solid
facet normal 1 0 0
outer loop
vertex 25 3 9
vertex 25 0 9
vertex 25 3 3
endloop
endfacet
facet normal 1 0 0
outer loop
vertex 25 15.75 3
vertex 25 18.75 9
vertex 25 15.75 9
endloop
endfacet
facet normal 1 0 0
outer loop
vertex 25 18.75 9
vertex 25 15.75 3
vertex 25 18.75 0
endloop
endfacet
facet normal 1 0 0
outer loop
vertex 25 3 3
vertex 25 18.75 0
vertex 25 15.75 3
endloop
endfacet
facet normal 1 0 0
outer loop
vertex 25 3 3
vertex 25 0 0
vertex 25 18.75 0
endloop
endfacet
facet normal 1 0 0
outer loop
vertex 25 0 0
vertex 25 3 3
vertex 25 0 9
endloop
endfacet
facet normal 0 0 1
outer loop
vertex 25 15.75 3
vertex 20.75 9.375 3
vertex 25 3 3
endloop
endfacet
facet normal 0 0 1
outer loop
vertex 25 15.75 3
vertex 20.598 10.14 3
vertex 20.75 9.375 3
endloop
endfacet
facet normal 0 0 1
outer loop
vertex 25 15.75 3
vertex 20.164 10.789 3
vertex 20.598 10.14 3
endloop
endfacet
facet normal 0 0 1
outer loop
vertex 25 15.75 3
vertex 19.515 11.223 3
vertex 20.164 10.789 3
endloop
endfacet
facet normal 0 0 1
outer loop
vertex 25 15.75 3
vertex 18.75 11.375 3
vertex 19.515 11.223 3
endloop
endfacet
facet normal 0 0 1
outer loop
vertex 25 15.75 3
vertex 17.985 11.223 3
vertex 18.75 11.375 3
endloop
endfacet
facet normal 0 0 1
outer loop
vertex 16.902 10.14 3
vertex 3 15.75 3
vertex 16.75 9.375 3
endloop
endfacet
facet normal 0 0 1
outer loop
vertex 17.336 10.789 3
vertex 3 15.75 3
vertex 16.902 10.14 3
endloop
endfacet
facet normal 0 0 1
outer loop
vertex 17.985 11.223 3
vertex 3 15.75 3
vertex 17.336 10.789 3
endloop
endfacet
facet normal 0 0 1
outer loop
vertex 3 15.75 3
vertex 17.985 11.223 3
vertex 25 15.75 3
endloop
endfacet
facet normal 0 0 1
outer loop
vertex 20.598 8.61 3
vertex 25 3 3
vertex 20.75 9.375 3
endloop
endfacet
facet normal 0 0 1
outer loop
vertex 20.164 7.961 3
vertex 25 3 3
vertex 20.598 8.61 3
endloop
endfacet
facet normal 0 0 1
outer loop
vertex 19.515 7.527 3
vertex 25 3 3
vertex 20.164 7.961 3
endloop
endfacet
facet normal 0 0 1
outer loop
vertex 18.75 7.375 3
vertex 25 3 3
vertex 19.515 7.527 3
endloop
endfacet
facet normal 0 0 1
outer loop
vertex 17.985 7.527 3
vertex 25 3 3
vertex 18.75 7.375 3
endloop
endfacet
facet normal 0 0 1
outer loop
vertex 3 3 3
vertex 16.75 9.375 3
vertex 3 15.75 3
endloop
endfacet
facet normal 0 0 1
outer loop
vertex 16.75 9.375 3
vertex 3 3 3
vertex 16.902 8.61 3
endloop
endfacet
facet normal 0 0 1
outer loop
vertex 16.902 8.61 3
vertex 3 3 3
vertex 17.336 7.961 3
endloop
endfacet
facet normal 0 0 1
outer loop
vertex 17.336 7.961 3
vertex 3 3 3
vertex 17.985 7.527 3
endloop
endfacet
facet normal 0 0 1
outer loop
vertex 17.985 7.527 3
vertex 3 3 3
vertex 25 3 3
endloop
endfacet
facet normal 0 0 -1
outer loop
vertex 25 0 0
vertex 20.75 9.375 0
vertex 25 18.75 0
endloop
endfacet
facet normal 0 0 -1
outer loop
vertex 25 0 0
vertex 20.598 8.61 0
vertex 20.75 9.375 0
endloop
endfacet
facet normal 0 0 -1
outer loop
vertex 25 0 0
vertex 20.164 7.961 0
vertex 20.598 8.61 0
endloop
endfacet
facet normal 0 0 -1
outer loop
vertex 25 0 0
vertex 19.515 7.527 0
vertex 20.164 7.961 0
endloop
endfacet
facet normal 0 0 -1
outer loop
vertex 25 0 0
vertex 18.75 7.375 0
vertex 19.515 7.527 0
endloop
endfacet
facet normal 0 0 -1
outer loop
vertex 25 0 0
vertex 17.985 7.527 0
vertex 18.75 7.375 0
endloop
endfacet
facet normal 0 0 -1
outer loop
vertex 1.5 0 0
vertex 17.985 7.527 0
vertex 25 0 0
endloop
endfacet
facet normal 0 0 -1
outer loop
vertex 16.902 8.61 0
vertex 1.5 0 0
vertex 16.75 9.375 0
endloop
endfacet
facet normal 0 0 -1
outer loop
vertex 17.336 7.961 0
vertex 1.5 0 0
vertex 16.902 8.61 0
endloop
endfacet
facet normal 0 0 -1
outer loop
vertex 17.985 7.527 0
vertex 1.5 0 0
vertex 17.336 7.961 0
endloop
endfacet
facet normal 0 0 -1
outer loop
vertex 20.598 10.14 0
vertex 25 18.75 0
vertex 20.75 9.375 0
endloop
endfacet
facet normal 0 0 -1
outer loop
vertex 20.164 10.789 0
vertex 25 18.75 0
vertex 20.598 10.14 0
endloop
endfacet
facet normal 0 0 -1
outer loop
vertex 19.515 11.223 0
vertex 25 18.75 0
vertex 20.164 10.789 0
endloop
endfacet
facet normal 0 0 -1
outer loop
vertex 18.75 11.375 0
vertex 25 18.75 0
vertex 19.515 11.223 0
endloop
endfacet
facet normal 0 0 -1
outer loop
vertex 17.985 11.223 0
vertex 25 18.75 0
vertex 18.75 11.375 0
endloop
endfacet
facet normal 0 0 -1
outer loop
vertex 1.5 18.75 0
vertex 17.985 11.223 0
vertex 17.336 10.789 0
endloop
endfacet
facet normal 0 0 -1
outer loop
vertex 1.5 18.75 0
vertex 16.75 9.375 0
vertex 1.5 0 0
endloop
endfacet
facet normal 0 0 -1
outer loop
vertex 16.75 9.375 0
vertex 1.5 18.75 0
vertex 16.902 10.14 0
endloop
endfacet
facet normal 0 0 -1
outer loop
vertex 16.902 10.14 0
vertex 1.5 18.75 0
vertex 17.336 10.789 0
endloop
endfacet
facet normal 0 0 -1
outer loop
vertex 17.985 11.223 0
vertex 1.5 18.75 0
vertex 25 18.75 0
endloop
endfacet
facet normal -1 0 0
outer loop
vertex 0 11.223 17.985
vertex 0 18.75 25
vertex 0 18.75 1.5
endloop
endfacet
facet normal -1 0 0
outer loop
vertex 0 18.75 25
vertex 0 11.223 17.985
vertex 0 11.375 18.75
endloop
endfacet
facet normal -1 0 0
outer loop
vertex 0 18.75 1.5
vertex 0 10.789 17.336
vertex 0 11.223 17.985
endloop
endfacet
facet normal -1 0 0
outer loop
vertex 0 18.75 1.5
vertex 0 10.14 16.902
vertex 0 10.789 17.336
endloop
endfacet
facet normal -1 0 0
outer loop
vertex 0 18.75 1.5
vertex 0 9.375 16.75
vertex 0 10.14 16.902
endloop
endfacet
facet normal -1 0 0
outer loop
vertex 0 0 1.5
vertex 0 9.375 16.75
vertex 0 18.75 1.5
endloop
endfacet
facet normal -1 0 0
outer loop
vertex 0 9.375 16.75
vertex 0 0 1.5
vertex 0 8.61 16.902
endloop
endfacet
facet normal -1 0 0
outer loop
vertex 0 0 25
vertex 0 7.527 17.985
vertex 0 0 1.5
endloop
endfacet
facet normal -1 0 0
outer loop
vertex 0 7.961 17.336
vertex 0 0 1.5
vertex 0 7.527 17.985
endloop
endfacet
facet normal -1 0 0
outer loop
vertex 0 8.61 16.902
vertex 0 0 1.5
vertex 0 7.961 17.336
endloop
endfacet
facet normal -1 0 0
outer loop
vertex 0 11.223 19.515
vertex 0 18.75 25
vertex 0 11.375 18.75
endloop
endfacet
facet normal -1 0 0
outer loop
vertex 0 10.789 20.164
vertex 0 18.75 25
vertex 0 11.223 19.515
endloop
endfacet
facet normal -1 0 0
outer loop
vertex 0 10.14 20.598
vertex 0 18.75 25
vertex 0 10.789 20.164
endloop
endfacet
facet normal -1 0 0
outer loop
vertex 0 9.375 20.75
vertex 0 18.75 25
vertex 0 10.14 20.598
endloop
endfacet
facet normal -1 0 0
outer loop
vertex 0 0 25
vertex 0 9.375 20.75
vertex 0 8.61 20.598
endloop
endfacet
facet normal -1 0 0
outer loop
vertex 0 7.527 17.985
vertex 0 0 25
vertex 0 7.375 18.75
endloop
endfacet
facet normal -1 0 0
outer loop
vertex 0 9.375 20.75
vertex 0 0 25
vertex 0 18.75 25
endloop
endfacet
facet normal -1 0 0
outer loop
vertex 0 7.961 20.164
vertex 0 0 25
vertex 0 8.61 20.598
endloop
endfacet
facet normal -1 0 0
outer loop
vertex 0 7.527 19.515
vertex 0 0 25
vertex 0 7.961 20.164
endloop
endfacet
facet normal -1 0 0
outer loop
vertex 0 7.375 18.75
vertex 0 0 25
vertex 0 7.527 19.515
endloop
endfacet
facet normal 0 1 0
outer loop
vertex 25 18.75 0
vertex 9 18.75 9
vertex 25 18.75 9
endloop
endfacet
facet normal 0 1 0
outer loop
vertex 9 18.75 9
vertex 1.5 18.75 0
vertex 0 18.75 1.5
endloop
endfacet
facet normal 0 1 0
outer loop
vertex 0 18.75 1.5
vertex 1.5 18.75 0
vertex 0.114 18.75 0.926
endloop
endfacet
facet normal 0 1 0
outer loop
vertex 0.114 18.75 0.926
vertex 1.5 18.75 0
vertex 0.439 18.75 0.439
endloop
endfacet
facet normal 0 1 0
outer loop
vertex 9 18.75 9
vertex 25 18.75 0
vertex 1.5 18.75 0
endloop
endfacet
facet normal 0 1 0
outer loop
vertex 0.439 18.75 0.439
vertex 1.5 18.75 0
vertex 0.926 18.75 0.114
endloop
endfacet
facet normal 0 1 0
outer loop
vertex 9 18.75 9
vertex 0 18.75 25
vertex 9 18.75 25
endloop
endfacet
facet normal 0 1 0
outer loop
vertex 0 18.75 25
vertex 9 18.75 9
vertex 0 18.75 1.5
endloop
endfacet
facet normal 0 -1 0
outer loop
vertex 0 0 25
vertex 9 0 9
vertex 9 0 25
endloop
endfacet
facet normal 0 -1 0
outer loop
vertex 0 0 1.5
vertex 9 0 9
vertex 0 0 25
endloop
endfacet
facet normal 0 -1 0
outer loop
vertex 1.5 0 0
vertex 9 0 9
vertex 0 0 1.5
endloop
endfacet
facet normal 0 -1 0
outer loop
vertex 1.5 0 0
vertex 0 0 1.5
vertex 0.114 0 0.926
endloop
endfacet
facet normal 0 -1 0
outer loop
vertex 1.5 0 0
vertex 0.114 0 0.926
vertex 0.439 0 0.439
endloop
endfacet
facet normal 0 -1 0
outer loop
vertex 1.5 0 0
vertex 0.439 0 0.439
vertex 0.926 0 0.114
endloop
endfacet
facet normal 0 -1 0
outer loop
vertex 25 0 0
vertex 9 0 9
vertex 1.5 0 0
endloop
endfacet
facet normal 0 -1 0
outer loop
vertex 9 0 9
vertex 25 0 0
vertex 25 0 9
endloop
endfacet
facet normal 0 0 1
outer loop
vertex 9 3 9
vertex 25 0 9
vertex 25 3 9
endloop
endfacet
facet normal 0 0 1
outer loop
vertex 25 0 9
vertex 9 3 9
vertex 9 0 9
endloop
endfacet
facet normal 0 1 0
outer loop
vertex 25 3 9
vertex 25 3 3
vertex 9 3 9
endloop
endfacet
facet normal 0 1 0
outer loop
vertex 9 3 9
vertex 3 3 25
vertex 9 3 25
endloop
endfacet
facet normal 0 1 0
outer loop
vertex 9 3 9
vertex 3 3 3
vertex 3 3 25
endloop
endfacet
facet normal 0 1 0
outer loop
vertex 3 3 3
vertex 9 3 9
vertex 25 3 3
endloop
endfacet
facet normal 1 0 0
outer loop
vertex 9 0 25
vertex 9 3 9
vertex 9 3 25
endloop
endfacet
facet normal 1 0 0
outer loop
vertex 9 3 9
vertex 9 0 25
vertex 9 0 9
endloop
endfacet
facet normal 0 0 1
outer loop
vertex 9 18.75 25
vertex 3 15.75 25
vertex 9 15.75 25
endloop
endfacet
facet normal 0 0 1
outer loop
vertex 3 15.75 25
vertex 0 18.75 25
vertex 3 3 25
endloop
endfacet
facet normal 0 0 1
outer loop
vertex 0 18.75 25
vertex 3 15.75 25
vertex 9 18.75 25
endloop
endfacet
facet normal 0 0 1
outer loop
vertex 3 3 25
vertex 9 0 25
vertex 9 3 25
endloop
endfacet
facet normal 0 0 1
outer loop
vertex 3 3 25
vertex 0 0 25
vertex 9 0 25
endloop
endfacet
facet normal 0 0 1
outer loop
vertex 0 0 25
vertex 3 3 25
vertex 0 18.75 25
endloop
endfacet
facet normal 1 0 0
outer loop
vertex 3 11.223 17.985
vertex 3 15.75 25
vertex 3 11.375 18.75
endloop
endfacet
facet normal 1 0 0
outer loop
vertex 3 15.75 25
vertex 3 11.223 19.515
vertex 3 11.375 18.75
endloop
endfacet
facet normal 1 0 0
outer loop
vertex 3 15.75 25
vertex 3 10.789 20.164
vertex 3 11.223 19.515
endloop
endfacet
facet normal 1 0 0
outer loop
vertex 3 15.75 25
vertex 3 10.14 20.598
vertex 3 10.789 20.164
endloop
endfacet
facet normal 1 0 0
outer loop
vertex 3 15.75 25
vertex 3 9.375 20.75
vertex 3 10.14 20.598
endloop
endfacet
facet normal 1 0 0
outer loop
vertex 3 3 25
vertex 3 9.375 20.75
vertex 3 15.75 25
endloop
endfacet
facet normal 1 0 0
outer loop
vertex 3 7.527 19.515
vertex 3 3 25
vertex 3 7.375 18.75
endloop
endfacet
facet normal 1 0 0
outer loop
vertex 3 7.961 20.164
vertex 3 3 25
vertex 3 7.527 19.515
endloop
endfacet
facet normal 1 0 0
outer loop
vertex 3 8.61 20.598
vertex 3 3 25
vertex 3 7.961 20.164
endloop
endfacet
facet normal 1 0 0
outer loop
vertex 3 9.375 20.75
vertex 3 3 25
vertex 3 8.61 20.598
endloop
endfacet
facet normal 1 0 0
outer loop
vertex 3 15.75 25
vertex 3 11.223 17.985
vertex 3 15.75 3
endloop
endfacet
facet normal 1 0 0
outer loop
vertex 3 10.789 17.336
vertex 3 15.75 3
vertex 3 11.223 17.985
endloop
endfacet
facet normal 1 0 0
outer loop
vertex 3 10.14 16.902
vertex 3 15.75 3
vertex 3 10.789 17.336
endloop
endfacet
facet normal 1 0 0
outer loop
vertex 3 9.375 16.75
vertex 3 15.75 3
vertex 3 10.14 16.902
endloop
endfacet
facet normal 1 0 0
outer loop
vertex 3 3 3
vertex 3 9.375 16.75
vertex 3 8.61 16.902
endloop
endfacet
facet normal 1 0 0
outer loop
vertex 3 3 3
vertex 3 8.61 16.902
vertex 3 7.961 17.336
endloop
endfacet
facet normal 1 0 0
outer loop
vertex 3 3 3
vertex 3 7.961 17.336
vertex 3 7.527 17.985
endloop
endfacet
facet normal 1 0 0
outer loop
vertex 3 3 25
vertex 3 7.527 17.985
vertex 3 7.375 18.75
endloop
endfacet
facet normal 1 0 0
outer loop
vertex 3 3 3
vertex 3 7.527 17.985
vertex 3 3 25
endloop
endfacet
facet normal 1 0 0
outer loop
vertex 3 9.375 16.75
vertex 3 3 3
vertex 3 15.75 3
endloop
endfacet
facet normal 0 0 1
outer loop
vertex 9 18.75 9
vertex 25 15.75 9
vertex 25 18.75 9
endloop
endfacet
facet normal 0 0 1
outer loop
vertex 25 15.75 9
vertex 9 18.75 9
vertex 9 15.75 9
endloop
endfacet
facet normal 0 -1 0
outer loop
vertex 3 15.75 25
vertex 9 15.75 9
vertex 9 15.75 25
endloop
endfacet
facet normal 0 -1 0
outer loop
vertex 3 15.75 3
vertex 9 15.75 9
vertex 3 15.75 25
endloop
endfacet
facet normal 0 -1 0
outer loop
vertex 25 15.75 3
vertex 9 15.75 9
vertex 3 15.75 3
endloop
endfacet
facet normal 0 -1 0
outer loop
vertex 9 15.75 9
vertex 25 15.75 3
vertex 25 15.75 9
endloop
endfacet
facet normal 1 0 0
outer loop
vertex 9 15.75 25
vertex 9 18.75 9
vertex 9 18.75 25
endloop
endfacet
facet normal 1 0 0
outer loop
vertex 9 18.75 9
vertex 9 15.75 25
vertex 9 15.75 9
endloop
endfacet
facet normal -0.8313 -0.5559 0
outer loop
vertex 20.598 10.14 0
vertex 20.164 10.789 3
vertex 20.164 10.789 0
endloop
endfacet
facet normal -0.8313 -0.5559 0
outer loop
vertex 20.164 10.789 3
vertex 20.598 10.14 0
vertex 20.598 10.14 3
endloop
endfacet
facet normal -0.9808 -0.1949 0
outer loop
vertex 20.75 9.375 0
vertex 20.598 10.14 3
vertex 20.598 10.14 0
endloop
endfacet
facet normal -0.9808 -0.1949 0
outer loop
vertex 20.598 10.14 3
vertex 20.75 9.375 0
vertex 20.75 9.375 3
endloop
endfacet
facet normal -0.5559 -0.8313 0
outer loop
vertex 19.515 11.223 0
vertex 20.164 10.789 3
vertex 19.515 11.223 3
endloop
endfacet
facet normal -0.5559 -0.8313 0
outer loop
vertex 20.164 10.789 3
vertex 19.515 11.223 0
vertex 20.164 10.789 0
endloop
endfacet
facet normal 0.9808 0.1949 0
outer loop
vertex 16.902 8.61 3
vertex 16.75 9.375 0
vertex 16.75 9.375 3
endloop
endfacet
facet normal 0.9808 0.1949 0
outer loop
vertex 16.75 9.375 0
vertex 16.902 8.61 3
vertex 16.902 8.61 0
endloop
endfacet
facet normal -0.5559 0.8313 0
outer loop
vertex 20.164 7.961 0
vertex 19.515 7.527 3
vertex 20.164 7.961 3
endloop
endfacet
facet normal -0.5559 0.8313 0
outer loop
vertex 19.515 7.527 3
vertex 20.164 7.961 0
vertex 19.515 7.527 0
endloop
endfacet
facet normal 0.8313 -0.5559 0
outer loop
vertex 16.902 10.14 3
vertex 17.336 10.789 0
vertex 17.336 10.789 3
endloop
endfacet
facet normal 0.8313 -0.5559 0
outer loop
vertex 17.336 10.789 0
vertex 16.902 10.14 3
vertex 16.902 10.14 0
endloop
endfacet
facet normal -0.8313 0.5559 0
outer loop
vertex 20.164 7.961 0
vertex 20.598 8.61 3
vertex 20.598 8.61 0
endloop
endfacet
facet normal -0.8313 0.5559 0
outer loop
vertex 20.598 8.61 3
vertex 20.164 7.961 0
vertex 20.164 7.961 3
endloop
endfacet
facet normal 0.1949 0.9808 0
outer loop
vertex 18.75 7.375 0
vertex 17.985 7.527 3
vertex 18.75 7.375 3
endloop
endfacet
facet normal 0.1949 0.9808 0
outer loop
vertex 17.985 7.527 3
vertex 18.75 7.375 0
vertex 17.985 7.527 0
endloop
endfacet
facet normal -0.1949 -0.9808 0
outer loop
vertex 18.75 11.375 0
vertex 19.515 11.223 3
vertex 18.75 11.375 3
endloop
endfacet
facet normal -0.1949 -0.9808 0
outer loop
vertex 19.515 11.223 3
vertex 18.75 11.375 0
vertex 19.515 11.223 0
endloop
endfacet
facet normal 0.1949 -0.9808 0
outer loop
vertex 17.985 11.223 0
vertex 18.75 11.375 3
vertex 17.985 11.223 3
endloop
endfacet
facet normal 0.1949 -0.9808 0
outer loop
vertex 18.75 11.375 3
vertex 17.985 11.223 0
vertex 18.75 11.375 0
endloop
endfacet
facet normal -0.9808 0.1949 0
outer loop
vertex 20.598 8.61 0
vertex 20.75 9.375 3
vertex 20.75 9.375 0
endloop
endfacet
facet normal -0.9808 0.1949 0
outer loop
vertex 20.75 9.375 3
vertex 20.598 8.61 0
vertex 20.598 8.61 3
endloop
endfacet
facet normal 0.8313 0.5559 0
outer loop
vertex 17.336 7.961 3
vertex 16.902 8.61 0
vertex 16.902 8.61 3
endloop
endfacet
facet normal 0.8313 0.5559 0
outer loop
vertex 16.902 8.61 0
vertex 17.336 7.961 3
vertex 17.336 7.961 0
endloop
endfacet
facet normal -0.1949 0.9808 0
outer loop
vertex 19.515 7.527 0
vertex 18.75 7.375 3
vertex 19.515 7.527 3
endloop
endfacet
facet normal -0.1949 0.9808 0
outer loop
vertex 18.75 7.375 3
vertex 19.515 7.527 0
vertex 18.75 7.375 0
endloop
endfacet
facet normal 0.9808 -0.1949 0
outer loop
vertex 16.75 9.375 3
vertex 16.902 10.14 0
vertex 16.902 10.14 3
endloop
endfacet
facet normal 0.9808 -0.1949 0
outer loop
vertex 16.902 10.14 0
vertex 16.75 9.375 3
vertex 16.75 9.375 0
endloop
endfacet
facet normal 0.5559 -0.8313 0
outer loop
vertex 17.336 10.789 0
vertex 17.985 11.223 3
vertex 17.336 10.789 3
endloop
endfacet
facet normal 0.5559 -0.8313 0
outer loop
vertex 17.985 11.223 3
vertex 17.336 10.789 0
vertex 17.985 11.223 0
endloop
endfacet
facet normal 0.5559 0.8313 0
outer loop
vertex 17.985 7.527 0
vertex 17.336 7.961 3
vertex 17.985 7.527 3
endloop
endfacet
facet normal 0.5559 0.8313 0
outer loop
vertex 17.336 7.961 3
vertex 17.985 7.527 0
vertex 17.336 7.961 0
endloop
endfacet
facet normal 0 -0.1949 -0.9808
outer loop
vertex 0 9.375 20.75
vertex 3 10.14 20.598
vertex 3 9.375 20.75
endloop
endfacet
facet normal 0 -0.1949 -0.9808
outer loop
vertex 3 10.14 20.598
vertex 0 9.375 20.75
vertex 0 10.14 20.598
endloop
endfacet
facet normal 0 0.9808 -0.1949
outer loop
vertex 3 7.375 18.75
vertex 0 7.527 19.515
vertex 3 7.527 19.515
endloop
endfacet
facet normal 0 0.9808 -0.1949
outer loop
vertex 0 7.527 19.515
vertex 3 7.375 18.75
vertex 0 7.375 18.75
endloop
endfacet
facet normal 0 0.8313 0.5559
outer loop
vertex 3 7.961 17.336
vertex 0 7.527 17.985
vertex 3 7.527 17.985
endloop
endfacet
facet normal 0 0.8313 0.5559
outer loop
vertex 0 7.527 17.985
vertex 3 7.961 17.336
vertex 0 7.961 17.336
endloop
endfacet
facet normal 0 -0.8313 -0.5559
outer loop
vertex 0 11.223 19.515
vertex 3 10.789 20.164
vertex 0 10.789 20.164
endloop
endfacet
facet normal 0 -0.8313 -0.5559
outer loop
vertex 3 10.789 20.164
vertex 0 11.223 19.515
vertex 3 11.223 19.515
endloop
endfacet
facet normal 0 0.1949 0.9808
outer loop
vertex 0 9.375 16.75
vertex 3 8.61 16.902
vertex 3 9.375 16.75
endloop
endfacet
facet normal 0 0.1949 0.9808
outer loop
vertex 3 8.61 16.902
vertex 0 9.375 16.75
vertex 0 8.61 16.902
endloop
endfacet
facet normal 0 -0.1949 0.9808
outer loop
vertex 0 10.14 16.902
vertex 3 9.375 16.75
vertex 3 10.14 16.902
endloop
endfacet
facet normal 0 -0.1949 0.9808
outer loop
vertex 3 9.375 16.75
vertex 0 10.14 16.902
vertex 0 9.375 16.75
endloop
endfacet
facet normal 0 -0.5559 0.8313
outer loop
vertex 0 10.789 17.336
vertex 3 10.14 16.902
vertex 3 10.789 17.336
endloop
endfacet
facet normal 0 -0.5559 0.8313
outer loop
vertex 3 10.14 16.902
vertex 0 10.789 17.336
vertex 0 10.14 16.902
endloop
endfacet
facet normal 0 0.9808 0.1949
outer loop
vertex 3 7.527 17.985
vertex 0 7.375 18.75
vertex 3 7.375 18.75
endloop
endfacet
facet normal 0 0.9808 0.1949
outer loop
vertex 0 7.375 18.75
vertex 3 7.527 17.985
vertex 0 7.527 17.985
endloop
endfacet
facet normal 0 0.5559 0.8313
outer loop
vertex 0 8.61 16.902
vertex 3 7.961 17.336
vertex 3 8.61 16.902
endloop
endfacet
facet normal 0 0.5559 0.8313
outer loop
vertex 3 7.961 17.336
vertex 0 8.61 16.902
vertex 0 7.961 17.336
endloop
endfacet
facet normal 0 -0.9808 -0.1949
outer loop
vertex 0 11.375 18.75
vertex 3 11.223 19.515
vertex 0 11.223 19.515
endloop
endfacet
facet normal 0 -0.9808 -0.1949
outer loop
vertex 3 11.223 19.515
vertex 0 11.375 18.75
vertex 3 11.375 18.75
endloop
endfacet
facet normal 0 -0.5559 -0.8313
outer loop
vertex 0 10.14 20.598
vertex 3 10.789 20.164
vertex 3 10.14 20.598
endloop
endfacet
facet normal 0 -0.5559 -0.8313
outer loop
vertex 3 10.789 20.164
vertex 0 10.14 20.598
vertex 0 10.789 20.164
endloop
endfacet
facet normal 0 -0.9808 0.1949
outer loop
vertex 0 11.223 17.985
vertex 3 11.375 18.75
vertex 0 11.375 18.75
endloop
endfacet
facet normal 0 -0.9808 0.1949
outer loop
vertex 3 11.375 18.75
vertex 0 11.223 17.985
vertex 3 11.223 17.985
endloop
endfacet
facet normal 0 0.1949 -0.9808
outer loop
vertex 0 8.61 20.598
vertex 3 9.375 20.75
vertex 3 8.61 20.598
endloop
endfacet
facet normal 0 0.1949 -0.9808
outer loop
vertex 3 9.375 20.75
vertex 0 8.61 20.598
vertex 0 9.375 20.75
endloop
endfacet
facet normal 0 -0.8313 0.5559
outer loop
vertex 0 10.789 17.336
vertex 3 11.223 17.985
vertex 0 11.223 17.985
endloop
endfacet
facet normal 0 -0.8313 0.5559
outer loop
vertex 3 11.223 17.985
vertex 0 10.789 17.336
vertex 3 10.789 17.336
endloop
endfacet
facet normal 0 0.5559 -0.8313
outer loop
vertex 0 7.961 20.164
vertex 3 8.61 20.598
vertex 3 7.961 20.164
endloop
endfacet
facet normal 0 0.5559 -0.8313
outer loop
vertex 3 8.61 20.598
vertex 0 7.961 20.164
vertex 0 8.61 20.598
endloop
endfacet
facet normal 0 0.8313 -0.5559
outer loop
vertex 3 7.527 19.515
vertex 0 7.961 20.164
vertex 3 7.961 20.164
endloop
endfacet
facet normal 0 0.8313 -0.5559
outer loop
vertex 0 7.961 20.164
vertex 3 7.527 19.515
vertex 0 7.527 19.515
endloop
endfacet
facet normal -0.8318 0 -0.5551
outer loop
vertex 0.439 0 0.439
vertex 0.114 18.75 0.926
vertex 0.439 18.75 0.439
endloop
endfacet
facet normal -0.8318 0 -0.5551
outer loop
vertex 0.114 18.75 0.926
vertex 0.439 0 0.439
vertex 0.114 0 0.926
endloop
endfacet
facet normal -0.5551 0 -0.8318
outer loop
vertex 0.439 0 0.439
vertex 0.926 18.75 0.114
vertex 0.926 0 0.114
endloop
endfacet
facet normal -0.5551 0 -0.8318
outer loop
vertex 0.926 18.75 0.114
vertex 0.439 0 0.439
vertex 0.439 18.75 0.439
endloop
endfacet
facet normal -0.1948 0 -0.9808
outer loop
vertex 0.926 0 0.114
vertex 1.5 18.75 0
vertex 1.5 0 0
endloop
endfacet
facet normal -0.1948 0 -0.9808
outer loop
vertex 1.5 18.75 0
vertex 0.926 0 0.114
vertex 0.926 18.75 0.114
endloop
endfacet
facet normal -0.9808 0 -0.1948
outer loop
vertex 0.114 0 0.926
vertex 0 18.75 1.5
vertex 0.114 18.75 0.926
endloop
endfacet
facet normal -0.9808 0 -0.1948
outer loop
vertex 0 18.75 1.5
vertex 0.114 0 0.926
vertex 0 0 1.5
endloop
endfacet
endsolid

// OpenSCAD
include <MCAD/2Dshapes.scad>

$fn=16;
t = 3;
l = 25;
s = 12.75; // shelf thickness (want this snug)
lip = 6; // how far under shelf lip should extend
h = t*2+s;

// Draw the basic corner part
module part1() {
    cube([l, h, t]);
    cube([l, t, lip+t]);
    cube([lip+t, t, l]);
    cube([t, h, l]);

    // Under shelf parts
    translate([0, t+s, t]) {
        cube([l, t, lip]);
    }
    translate([t, t+s, 0]) {
        cube([lip, t, l]);
    }
}


// Add a couple nail/screw holes
difference() {
    part1();
    translate([l*3/4, t + s/2, -0.01])
        cylinder(h=t+1, r=2);
    translate([-0.01, t+s/2, l*3/4])
        rotate([0, 90, 0])
            cylinder(h=t+1, r=2);
            
    // Try to round the corner a little
    translate([1.5, -0.01, 1.5]) rotate([-90,0,0])
        linear_extrude(h+1)
            donutSlice(1.5,3, 90,180);
}
